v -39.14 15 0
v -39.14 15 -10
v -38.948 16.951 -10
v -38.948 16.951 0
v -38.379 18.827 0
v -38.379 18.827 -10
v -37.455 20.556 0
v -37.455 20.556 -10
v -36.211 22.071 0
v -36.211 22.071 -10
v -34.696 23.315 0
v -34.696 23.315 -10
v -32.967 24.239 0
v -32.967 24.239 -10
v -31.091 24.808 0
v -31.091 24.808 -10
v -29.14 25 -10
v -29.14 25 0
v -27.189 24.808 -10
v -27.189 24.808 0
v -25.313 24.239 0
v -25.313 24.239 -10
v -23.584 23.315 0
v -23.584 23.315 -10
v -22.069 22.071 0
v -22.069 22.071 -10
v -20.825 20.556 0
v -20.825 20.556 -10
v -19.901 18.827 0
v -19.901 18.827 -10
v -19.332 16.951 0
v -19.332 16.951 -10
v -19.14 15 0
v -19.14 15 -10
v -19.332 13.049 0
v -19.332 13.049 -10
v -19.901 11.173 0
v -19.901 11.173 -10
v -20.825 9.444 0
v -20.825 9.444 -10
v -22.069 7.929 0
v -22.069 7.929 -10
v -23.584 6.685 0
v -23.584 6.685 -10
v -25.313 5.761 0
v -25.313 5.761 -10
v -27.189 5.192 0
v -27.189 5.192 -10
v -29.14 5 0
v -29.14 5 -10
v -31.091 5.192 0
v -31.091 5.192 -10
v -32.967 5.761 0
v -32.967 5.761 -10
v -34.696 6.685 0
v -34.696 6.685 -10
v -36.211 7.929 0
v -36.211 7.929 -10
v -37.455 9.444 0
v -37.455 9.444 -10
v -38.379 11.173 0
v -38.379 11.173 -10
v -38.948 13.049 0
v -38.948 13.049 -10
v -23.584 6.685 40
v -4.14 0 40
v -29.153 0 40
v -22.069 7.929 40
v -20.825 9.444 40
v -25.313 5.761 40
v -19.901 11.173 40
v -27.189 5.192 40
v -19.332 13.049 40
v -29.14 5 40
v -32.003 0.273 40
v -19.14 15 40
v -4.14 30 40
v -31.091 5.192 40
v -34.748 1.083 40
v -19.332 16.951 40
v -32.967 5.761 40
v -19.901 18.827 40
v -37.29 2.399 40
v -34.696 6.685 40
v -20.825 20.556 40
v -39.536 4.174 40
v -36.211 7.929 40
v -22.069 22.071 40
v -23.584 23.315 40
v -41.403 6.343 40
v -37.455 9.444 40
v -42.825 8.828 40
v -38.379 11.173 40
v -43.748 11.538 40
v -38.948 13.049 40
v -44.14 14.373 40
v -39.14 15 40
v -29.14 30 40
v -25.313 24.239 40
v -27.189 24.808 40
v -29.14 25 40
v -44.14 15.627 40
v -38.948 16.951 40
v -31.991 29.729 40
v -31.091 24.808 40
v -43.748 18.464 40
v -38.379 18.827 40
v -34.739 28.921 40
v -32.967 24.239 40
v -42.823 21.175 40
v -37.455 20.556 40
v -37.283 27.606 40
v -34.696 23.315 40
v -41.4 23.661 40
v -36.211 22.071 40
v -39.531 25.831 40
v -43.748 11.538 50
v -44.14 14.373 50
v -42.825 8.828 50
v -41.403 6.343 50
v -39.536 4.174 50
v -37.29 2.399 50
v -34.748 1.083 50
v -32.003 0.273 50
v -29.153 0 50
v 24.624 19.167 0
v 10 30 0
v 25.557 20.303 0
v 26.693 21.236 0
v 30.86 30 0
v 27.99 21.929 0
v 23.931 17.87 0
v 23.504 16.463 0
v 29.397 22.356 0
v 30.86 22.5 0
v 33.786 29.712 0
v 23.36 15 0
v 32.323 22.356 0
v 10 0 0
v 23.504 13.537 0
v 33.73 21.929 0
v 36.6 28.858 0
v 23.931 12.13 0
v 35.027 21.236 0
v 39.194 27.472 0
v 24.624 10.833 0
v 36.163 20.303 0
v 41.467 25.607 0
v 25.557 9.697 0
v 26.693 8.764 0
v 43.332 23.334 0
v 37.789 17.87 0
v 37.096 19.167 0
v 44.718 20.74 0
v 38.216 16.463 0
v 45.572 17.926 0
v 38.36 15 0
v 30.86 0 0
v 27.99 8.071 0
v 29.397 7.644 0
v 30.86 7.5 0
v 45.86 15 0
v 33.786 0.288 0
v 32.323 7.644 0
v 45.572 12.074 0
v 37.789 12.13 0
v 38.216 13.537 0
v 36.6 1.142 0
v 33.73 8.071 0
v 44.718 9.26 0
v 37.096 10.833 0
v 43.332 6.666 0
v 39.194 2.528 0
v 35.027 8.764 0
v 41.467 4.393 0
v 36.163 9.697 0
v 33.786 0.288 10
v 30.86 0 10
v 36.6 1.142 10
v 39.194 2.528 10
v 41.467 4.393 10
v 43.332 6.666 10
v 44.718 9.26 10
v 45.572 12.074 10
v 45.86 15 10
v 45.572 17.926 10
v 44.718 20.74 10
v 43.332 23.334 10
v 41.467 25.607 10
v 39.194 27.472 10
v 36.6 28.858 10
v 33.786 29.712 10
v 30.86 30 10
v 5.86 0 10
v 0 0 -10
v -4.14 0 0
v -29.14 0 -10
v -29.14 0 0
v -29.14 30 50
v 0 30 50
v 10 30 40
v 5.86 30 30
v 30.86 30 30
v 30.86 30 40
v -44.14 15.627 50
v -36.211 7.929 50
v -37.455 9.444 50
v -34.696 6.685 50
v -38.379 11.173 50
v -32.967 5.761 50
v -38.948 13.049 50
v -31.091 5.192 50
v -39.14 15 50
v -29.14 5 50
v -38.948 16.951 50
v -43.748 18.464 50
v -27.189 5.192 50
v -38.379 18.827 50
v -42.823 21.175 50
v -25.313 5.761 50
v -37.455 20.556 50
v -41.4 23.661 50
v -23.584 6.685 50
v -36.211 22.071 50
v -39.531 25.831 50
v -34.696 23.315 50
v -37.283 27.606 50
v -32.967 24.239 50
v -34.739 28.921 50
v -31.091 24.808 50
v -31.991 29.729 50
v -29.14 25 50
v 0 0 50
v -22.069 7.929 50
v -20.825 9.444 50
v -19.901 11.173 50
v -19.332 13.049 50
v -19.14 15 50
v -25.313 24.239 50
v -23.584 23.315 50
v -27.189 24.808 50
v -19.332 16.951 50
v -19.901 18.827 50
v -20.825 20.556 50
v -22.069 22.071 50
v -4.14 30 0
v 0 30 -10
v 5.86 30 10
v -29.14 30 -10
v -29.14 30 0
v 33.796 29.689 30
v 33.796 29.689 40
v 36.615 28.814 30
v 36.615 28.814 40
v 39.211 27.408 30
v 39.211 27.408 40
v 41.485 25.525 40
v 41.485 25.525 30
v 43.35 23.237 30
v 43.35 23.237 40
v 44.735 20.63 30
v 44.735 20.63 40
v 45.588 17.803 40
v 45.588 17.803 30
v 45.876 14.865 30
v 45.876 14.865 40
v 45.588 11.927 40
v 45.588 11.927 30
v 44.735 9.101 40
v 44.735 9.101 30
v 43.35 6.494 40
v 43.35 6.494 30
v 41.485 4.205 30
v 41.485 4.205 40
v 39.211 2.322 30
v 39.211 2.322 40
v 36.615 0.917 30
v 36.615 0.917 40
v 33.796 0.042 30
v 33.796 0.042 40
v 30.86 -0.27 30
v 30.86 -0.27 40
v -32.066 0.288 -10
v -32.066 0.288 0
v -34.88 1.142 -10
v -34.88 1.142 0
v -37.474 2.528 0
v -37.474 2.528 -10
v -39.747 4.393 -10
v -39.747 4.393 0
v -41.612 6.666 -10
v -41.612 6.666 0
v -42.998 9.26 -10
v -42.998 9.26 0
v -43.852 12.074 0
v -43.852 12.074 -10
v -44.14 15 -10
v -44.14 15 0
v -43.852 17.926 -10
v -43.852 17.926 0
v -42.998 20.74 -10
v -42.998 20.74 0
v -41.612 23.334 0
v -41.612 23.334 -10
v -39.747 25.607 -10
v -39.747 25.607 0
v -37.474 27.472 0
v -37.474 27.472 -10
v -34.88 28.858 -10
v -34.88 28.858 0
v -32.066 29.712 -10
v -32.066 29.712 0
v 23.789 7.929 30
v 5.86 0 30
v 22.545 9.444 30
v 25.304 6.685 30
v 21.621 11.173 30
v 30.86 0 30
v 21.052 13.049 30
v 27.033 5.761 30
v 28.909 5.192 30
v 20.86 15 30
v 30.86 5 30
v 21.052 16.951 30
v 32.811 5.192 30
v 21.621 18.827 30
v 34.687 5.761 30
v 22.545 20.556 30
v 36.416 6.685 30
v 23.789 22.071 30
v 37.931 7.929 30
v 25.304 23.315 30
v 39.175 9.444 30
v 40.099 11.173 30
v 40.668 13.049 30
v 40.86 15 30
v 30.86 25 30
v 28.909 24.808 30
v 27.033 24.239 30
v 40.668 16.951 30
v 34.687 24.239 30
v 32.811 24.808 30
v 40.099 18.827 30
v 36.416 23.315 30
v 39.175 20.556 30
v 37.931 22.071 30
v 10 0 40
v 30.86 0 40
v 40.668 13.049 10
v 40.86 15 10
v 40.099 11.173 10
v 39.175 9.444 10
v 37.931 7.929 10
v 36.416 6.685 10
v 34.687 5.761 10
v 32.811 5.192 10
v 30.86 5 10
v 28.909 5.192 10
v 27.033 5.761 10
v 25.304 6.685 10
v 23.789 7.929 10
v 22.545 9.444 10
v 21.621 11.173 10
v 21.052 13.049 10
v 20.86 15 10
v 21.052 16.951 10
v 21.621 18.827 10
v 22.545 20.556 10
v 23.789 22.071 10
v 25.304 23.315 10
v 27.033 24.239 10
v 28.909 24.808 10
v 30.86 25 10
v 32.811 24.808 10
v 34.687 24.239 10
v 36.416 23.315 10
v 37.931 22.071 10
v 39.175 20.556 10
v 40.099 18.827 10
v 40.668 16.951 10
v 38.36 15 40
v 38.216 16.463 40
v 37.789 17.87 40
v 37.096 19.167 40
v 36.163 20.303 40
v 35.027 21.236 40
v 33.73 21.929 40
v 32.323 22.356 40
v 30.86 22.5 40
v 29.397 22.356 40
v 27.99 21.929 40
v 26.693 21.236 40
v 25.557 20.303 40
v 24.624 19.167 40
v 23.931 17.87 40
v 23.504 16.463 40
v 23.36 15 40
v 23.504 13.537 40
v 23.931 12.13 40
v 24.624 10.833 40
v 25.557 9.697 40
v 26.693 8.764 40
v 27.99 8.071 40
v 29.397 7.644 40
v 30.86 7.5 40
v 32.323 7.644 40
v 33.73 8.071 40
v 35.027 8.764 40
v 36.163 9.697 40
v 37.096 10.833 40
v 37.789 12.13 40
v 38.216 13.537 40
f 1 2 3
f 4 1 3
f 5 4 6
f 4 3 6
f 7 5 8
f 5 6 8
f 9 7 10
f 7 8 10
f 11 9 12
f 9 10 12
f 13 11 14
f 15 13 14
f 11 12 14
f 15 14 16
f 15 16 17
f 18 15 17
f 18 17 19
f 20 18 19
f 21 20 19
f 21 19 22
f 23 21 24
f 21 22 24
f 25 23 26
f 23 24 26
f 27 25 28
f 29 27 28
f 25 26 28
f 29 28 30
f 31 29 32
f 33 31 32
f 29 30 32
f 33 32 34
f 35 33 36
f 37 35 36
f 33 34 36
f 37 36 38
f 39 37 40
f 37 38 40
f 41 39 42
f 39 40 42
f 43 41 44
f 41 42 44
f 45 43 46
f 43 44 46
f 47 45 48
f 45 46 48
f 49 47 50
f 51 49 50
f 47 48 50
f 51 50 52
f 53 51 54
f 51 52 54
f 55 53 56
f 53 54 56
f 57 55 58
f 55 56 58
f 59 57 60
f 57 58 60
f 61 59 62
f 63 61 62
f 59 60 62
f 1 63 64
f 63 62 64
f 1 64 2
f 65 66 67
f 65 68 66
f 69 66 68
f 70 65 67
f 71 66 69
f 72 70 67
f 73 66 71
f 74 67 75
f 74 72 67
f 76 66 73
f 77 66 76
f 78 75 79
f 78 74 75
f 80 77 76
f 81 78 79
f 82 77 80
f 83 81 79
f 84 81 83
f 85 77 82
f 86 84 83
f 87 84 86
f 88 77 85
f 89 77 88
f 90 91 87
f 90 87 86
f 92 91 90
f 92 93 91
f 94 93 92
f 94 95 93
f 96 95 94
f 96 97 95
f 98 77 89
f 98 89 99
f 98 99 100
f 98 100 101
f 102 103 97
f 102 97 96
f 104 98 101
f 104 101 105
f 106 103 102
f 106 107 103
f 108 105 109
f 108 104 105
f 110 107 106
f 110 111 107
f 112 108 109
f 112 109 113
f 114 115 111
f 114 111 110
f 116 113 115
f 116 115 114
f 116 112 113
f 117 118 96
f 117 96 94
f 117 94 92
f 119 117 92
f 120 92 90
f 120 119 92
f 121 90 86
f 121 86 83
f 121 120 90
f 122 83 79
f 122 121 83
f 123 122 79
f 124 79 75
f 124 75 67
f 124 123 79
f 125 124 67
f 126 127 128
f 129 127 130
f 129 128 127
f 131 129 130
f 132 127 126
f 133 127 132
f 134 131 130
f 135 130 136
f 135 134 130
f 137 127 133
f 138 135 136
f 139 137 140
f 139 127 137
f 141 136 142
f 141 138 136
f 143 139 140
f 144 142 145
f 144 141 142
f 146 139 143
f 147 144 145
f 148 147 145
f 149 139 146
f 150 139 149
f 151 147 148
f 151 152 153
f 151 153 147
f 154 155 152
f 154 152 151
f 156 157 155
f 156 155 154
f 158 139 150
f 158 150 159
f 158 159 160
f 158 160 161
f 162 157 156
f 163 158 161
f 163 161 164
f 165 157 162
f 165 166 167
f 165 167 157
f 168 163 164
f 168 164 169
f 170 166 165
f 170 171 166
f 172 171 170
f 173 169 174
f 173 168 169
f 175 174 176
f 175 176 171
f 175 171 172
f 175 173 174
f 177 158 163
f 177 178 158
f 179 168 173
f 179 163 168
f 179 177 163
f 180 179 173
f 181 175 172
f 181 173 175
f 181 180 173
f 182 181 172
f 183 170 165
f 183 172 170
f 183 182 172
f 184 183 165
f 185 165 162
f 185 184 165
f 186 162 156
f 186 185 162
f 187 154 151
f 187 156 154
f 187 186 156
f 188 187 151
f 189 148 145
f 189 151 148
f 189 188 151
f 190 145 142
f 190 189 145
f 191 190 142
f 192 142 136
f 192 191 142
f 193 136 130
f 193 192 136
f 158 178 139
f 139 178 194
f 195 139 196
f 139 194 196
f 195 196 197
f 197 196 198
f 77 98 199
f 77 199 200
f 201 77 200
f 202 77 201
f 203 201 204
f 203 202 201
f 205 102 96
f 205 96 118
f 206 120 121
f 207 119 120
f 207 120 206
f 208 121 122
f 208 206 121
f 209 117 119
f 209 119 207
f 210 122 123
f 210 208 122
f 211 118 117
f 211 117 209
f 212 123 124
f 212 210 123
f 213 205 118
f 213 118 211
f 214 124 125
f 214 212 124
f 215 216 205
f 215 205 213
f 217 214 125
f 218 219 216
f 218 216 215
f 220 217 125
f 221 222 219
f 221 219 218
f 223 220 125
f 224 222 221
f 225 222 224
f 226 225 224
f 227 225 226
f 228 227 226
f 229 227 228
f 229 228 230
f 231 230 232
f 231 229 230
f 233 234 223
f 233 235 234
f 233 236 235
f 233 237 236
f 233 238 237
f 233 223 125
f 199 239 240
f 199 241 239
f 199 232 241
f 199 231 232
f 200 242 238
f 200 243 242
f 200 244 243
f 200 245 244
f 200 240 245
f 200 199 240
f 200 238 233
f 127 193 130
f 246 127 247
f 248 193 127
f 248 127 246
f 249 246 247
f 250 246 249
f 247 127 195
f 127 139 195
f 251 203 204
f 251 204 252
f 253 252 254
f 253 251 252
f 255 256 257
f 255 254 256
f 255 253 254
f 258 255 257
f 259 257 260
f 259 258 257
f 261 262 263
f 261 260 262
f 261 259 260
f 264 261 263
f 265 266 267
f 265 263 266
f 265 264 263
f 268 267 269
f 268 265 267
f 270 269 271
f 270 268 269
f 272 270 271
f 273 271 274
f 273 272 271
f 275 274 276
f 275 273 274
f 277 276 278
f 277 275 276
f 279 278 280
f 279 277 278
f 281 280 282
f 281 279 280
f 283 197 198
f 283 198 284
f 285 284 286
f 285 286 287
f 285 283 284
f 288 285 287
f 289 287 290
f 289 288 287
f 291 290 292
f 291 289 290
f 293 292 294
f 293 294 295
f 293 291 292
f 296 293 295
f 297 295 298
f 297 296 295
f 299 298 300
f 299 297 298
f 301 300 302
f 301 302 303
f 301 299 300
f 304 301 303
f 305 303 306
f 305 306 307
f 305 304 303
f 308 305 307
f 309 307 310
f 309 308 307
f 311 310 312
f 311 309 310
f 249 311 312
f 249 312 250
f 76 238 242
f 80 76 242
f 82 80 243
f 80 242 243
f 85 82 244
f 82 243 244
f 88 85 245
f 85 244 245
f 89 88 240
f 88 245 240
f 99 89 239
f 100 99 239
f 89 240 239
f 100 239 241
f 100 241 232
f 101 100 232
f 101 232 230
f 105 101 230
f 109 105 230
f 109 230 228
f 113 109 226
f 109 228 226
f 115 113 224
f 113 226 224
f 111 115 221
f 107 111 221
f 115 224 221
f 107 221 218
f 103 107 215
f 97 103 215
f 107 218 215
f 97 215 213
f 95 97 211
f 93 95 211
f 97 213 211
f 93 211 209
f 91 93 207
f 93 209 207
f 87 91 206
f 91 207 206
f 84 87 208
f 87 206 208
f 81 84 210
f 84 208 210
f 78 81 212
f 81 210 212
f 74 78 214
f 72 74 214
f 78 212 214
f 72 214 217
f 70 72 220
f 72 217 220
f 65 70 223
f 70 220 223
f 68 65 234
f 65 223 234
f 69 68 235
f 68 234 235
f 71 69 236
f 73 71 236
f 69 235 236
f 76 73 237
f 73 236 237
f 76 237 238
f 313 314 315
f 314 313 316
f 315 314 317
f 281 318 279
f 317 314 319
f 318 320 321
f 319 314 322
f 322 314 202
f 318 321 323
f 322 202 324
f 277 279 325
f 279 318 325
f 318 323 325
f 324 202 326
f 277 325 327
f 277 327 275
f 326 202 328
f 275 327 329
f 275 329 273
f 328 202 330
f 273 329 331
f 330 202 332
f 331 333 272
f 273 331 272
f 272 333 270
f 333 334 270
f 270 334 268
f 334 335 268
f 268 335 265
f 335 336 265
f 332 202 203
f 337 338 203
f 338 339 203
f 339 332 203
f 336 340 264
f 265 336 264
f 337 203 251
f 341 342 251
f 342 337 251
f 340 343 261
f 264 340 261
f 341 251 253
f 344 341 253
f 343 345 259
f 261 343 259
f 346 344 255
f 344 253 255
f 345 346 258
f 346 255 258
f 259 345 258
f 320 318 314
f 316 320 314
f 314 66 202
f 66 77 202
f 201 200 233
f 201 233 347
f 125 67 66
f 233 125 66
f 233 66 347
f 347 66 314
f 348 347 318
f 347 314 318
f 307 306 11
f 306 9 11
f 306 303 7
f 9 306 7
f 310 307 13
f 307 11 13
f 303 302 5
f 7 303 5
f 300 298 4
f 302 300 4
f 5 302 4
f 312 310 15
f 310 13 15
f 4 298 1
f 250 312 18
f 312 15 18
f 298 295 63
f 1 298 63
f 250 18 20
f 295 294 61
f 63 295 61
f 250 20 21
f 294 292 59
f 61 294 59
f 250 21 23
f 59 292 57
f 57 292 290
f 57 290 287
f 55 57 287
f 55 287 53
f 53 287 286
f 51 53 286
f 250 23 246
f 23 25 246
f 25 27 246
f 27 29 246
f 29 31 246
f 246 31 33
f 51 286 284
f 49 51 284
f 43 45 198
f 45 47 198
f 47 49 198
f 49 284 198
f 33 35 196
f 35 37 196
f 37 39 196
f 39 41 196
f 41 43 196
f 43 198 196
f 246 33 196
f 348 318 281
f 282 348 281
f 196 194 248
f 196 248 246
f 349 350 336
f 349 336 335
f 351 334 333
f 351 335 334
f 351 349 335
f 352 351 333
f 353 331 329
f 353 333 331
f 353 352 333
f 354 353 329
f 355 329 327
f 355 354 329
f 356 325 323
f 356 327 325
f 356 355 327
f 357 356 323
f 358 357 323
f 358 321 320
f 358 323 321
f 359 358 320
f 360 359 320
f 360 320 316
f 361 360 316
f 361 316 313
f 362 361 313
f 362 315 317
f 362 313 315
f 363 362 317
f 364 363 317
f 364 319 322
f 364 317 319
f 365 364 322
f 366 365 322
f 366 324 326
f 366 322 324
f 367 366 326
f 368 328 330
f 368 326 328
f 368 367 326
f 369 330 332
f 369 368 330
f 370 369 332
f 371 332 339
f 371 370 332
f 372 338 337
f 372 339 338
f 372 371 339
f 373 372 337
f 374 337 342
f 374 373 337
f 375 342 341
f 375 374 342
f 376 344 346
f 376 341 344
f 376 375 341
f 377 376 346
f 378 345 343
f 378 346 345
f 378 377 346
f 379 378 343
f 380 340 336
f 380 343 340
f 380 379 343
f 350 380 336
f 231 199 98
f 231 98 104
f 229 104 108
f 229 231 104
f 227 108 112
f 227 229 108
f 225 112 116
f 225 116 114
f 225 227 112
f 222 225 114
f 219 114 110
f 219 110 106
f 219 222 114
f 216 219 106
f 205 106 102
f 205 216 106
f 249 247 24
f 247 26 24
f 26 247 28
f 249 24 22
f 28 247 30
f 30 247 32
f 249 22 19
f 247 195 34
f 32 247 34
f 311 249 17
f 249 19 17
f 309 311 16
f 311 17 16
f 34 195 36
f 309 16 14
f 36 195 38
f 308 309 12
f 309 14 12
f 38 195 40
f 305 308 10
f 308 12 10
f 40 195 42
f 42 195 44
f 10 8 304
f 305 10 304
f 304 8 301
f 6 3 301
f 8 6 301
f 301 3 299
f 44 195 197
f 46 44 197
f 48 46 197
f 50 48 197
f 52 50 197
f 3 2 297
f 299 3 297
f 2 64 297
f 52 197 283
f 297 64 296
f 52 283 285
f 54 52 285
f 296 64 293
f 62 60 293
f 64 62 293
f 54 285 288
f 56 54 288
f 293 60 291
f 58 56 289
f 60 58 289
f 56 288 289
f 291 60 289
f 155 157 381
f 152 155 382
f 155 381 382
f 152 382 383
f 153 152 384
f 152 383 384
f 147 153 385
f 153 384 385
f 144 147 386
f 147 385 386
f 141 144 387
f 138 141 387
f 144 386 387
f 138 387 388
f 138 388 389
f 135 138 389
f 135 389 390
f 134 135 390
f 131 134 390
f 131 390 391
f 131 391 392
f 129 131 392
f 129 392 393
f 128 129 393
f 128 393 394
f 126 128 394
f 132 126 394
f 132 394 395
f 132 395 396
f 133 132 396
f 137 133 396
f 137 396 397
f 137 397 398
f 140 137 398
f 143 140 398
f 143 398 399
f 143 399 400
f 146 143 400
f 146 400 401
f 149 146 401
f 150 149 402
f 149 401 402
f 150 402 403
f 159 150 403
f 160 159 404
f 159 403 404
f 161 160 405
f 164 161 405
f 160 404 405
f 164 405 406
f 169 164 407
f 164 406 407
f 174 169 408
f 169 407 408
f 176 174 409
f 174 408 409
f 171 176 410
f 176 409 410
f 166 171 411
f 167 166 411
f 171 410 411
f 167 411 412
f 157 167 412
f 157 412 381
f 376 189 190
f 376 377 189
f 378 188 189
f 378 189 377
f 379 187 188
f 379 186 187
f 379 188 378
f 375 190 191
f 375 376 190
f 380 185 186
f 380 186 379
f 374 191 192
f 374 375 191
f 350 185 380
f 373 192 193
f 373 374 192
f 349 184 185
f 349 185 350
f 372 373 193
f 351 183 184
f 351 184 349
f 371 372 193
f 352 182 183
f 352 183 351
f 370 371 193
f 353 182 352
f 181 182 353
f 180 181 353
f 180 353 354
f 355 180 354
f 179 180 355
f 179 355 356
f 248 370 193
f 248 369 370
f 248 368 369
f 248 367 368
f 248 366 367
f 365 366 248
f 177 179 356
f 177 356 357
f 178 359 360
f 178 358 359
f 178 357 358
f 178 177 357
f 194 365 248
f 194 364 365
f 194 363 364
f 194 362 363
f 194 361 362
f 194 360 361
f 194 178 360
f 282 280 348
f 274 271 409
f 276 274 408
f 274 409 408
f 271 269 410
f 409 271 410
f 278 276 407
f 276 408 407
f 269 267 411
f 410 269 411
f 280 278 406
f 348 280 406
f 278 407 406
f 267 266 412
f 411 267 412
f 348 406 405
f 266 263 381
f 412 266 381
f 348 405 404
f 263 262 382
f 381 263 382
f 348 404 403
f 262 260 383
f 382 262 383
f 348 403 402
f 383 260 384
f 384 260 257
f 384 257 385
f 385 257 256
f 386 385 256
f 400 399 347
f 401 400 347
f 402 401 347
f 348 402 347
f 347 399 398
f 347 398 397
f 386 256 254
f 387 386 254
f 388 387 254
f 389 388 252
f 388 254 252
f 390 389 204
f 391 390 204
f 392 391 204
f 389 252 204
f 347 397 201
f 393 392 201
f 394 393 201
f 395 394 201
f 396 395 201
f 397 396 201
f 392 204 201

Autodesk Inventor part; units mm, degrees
ref_plane "YZ Plane" through (0, 0, 0) normal (1, 0, 0) x (0, 1, 0)
ref_plane "XZ Plane" through (0, 0, 0) normal (0, 1, 0) x (-1, 0, 0)
ref_plane "XY Plane" through (0, 0, 0) normal (0, 0, 1) x (1, 0, 0)
sketch "Boceto1" plane through (0, 0, 0) normal (0, 1, 0) x (-1, 0, 0)
  line L0 (0, -10) -> (44.14, -10)
  line L1 (44.14, -10) -> (44.14, 0)
  line L2 (44.14, 0) -> (4.14, 0)
  line L3 (4.14, 0) -> (14.14, 0) construction
  line L4 (4.14, 0) -> (14.14, 0) construction
  line L5 (-5.86, 10) -> (4.14, 0)
  line L6 (-10, 0) -> (0, -10)
  line L7 (-10, 0) -> (-45.86, 0)
  line L8 (-10, 0) -> (25.86, 0) construction
  line L9 (-45.86, 0) -> (-45.86, 10)
  line L10 (-45.86, 10) -> (-5.86, 10)
  point P0 (0, 0)
  dimension "d10" = 44.14
  dimension "d12" = 40
  dimension "d19" = 35.86
  dimension "d21" = 10
extrude "Extrusión1" add sketch "Boceto1" along normal blind 30
sketch "Boceto2" plane through (5.86, 0, 10) normal (0, 0, 1) x (1, 0, 0)
  point P0 (-5.86, 0)
sketch "Boceto3" plane through (0, 0, -10) normal (0, 0, -1) x (-1, 0, 0)
  line L0 (44.14, 0) -> (44.14, 30) projected
  line L1 (0, 0) -> (0, 30) projected
  line L2 (44.14, 0) -> (44.14, 15)
  line L3 (44.14, 0) -> (59.14, 0) construction
  circle A0 centre (29.14, 15) radius 10
  line L4 (0, 0) -> (44.14, 0) projected
  line L5 (29.14, 15) -> (44.14, 15) construction
  arc A1 (29.14, 0) -> (29.14, 30) centre (29.14, 15) ccw
  line L6 (44.14, 30) -> (29.14, 30)
  line L7 (44.14, 0) -> (29.14, 0)
  dimension "d24" = 44.14
  dimension "d26" = 90
  dimension "d29" = 15
  dimension "d30" = 15
extrude "Extrusión2" cut sketch "Boceto3" against normal blind 30
sketch "Boceto4" plane through (5.86, 0, 10) normal (0, 0, 1) x (1, 0, 0)
  line L0 (40, 30) -> (4.14, 30) projected
  line L1 (40, 30) -> (40, 15)
  line L2 (40, 0) -> (40, 30) projected
  circle A0 centre (25, 15) radius 7.5
  circle A1 centre (25, 15) radius 10
  arc A2 (25, 0) -> (25, 30) centre (25, 15) ccw
  line L3 (40, 0) -> (25, 0)
  point P0 (-5.86, 0)
  dimension "d34" = 15
  dimension "d37" = 15
extrude "Extrusión3" cut sketch "Boceto4" against normal blind 30 contours L1 A2 L0 | L2 L3 A2
sketch "Boceto5" plane through (5.86, 0, 10) normal (0, 0, 1) x (1, 0, 0)
  arc A0 (25, 0) -> (25, 30) centre (25, 15) ccw projected
  line L0 (40, 15) -> (25, 15)
  circle A1 centre (25, 15) radius 10
  point P0 (-5.86, 0)
  dimension "d41" = 20
extrude "Extrusión4" add sketch "Boceto5" along normal blind 20
sketch "Boceto6" plane through (30.86, 15, 30) normal (0, 0, 1) x (1, 0, 0)
  line L0 (-25, 15) -> (0, 15) projected
  arc A0 (0, -15.2696) -> (0, 15) centre (-0.1195, -0.1348) ccw
  line L1 (0, 15) -> (0, -15.2696)
extrude "Extrusión5" add sketch "Boceto6" along normal blind 10
sketch "Boceto7" plane through (0, 30, 0) normal (0, 1, 0) x (1, 0, 0)
  line L0 (20.86, -30) -> (30.86, -30) projected
  line L1 (30.86, -30) -> (5.86, -30)
  line L2 (30.86, -30) -> (30.86, -40) projected
  line L3 (30.86, -40) -> (10, -40)
  line L4 (0, -50) -> (10, -40)
  line L5 (-4.14, -30) -> (5.86, -30) construction
  line L6 (-4.14, -40) -> (5.86, -30)
  line L7 (-4.14, -40) -> (-44.14, -40)
  line L8 (-4.14, -40) -> (35.86, -40) construction
  line L9 (-44.14, -40) -> (-44.14, -50)
  line L10 (-44.14, -50) -> (0, -50)
  point P0 (0, 0)
  dimension "d46" = 25
  dimension "d51" = 10
  dimension "d53" = 40
  dimension "d54" = 180
  dimension "d55" = 10
  dimension "d56" = 90
extrude "Extrusión6" add sketch "Boceto7" against normal blind 30
sketch "Boceto8" plane through (-44.14, 30, 50) normal (0, 0, 1) x (1, 0, 0)
  line L0 (40, 0) -> (0, 0) projected
  circle A0 centre (15, -15) radius 10
  circle A1 centre (15, -15) radius 10 projected
  line L1 (0, 0) -> (0, -30) projected
  arc A2 (15, 0) -> (14.9869, -30) centre (14.9869, -15) ccw
  line L2 (0, -30) -> (40, -30) projected
  line L3 (14.9869, -30) -> (0, -30)
  point P0 (44.14, -30)
  point P1 (0, -14.3743)
  point P2 (0, -15.6257)
  dimension "d61" = 20
extrude "Extrusión7" cut sketch "Boceto8" against normal blind 30 contours A2 L1 L0 | A2 L2 L1 | A0
sketch "Boceto9" plane through (30.86, 15, 40) normal (0, 0, 1) x (1, 0, 0)
  circle A0 centre (0, 0) radius 7.5
  point P0 (-30.86, -15)
  dimension "d65" = 15
extrude "Extrusión8" cut sketch "Boceto9" against normal blind 60
